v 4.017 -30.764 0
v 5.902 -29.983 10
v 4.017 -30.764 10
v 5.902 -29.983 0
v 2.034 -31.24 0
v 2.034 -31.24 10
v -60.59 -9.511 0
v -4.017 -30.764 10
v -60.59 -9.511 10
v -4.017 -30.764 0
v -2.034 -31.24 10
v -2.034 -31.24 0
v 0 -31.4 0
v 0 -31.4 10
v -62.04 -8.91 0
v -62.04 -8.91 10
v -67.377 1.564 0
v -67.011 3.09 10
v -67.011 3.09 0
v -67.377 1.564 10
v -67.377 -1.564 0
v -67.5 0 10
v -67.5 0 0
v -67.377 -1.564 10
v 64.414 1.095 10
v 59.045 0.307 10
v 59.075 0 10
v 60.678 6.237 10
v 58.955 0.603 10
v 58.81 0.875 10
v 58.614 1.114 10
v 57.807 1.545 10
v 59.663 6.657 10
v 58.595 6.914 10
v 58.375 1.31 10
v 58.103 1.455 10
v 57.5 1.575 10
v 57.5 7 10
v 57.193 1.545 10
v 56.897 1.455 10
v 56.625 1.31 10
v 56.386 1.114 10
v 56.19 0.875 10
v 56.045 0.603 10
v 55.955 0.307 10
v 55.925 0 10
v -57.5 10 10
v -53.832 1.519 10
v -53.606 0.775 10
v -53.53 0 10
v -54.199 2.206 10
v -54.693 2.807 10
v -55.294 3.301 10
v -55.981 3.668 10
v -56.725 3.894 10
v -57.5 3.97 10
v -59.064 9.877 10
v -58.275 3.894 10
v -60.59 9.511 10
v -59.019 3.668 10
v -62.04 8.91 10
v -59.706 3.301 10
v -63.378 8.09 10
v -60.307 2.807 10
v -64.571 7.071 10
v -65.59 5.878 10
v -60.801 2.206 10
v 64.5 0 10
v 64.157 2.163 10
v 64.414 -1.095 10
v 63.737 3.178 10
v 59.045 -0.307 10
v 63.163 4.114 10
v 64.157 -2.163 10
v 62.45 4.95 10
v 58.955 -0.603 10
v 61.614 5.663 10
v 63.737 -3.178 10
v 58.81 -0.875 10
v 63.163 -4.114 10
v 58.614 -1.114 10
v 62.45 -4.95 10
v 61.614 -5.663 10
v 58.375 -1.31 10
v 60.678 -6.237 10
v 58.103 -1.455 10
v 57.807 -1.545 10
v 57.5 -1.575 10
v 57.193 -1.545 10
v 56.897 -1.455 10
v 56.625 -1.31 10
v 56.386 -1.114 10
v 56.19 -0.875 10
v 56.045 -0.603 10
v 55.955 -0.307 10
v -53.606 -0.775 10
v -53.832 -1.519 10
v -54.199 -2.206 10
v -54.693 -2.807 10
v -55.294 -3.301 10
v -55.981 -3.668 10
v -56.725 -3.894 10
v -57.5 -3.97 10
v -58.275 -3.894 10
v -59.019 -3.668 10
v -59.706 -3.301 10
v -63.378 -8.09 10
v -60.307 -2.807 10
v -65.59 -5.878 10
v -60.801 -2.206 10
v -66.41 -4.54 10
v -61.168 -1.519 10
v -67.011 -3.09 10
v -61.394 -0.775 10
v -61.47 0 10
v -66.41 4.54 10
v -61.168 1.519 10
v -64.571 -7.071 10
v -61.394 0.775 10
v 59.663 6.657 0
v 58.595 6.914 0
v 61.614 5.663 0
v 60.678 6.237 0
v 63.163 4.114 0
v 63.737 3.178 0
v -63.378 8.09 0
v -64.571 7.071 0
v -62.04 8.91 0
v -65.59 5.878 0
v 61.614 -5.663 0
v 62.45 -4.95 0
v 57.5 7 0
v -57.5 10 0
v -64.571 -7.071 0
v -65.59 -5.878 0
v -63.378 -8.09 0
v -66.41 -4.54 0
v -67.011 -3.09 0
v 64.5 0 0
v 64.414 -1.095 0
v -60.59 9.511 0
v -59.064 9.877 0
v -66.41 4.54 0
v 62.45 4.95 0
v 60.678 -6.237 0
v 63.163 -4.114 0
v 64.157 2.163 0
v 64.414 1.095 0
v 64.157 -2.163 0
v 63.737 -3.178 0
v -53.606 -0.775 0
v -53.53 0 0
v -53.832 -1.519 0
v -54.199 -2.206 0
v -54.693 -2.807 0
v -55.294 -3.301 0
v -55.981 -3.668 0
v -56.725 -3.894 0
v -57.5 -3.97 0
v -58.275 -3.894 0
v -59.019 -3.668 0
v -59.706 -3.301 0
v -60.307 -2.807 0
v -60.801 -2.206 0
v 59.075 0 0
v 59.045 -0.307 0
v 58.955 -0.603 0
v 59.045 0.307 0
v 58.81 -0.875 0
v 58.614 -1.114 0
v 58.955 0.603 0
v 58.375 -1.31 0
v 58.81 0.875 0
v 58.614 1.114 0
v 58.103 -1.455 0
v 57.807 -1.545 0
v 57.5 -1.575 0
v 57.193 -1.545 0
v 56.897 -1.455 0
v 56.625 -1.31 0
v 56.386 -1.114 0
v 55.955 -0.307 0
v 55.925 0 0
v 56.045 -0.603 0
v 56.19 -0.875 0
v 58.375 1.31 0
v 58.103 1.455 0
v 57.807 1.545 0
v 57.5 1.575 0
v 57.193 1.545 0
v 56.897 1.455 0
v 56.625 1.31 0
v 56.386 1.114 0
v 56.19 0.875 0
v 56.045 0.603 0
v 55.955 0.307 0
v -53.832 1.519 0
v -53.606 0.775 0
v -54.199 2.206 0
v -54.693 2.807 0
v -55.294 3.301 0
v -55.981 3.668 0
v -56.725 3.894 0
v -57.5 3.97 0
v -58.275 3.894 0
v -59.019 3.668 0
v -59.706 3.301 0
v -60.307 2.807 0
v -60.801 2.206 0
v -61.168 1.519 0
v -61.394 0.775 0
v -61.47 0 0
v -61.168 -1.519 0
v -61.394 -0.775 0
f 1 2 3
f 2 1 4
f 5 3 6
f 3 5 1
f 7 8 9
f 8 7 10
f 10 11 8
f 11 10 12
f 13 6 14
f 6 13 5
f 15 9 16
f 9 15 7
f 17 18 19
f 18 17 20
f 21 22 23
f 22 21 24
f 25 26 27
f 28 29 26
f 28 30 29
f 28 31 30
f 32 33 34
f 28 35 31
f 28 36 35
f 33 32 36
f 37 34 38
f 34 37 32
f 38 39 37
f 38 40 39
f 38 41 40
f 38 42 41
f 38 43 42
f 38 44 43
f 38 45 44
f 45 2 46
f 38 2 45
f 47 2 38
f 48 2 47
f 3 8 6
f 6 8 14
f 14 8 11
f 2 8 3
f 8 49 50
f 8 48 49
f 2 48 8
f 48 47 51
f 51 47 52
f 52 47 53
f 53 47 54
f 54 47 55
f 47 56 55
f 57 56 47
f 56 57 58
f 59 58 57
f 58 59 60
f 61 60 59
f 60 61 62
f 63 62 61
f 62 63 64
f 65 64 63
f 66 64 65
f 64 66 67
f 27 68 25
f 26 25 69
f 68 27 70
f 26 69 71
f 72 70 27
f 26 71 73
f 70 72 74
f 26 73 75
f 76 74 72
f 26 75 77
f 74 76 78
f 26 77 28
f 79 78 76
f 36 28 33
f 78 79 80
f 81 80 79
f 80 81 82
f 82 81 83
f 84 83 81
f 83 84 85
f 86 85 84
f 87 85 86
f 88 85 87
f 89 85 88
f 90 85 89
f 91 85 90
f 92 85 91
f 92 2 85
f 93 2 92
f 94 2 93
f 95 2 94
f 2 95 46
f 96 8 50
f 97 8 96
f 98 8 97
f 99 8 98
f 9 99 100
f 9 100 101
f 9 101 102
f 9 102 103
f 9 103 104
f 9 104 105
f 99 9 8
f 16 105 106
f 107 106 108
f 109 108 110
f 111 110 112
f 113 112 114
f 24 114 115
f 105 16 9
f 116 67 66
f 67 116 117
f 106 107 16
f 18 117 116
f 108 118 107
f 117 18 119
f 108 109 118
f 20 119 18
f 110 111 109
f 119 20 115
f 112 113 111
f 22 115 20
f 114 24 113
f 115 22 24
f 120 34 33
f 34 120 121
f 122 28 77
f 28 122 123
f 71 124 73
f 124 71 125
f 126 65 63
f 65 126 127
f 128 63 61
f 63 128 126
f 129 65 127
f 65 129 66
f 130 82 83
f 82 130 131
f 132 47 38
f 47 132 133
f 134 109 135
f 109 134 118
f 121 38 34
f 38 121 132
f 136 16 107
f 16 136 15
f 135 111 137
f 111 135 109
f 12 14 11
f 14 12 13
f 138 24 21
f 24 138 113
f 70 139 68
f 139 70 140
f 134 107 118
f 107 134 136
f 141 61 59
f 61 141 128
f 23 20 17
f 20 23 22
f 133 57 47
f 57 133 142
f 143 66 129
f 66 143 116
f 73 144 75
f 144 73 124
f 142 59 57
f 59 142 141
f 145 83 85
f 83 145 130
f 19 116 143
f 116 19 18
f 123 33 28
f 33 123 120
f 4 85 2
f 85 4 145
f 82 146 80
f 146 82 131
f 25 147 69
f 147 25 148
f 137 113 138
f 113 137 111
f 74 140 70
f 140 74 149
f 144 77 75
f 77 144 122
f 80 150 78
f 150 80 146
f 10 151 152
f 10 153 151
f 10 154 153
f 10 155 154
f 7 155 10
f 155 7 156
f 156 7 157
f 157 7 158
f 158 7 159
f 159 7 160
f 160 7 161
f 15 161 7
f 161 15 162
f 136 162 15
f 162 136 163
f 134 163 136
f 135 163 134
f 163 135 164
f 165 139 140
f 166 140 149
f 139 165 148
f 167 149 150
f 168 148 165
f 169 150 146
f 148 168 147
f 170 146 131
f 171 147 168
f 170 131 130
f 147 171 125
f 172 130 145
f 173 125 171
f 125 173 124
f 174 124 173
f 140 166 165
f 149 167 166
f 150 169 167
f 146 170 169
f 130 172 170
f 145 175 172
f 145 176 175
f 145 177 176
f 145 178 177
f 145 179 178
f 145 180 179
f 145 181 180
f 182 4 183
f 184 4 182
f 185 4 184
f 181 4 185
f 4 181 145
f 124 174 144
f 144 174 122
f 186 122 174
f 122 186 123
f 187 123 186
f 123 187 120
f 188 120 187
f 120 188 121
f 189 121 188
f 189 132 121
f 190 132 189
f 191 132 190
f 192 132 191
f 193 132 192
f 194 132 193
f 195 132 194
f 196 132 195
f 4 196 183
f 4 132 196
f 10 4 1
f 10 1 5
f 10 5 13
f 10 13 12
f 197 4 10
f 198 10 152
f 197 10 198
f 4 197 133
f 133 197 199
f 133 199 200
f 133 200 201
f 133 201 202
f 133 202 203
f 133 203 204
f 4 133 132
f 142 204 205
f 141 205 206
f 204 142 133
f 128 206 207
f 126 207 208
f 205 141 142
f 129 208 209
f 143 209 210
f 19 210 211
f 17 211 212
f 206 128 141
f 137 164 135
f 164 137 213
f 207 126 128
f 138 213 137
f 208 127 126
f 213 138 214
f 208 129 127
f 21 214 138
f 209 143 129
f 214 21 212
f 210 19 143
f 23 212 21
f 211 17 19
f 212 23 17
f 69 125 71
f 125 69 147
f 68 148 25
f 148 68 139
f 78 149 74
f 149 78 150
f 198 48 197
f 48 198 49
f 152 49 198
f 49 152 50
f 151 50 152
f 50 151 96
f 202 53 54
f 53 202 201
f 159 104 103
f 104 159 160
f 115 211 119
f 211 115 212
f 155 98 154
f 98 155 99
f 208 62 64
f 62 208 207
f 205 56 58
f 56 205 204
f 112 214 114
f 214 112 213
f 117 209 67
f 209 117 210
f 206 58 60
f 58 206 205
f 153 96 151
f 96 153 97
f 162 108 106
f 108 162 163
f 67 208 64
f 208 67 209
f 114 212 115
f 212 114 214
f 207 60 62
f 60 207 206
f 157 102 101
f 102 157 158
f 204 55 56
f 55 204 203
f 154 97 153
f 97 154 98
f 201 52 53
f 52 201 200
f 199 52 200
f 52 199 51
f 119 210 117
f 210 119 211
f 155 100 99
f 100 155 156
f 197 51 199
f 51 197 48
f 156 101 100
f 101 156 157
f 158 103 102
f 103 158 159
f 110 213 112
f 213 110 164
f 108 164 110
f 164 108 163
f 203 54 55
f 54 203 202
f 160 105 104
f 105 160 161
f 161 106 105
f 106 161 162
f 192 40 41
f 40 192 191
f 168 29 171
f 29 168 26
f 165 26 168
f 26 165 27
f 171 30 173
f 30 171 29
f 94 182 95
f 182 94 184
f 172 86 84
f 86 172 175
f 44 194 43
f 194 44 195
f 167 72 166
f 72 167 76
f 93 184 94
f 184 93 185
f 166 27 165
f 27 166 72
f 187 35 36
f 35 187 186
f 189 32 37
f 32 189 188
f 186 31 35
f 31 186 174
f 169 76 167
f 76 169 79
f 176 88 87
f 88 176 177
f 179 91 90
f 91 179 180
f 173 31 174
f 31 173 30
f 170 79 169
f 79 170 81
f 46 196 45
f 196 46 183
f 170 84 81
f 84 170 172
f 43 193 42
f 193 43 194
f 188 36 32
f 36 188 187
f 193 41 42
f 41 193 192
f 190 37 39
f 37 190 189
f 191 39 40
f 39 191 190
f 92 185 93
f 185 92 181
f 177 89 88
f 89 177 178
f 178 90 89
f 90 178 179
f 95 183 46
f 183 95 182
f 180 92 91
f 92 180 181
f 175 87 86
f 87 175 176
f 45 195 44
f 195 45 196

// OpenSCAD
$fn = 32;

// ----------------------------------------------------------------------
// Lever: 115 mm between the bosses, 10 mm thick, smooth outline
// ----------------------------------------------------------------------

// --- parameters (mm) ---
lever_l = 115;            // distance between the boss centres
boss_a = 20;              // first boss diameter
boss_b = 14;              // second boss diameter
bore_a = 7.94;            // first bore
bore_b = 3.15;            // second bore
lever_t = 10;             // lever thickness
boss_c = 26;              // middle boss diameter
bend = 18.4;              // how far the middle boss drops

lever_profile = [[-67.5, 0], [-67.377, -1.564], [-67.011, -3.09], [-66.41, -4.54], [-65.59, -5.878], [-64.571, -7.071], [-63.378, -8.09], [-62.04, -8.91], [-60.59, -9.511], [-4.017, -30.764], [-2.034, -31.24], [0, -31.4], [2.034, -31.24], [4.017, -30.764], [5.902, -29.983], [60.678, -6.237], [61.614, -5.663], [62.45, -4.95], [63.163, -4.114], [63.737, -3.178], [64.157, -2.163], [64.414, -1.095], [64.5, 0], [64.414, 1.095], [64.157, 2.163], [63.737, 3.178], [63.163, 4.114], [62.45, 4.95], [61.614, 5.663], [60.678, 6.237], [59.663, 6.657], [58.595, 6.914], [57.5, 7], [-57.5, 10], [-59.064, 9.877], [-60.59, 9.511], [-62.04, 8.91], [-63.378, 8.09], [-64.571, 7.071], [-65.59, 5.878], [-66.41, 4.54], [-67.011, 3.09], [-67.377, 1.564]];

difference() {
  linear_extrude(height = lever_t) polygon(lever_profile);
  translate([-57.5, 0, -2.5]) cylinder(h = lever_t + 5, d = bore_a);
  translate([57.5, 0, -2.5]) cylinder(h = lever_t + 5, d = bore_b);
}
